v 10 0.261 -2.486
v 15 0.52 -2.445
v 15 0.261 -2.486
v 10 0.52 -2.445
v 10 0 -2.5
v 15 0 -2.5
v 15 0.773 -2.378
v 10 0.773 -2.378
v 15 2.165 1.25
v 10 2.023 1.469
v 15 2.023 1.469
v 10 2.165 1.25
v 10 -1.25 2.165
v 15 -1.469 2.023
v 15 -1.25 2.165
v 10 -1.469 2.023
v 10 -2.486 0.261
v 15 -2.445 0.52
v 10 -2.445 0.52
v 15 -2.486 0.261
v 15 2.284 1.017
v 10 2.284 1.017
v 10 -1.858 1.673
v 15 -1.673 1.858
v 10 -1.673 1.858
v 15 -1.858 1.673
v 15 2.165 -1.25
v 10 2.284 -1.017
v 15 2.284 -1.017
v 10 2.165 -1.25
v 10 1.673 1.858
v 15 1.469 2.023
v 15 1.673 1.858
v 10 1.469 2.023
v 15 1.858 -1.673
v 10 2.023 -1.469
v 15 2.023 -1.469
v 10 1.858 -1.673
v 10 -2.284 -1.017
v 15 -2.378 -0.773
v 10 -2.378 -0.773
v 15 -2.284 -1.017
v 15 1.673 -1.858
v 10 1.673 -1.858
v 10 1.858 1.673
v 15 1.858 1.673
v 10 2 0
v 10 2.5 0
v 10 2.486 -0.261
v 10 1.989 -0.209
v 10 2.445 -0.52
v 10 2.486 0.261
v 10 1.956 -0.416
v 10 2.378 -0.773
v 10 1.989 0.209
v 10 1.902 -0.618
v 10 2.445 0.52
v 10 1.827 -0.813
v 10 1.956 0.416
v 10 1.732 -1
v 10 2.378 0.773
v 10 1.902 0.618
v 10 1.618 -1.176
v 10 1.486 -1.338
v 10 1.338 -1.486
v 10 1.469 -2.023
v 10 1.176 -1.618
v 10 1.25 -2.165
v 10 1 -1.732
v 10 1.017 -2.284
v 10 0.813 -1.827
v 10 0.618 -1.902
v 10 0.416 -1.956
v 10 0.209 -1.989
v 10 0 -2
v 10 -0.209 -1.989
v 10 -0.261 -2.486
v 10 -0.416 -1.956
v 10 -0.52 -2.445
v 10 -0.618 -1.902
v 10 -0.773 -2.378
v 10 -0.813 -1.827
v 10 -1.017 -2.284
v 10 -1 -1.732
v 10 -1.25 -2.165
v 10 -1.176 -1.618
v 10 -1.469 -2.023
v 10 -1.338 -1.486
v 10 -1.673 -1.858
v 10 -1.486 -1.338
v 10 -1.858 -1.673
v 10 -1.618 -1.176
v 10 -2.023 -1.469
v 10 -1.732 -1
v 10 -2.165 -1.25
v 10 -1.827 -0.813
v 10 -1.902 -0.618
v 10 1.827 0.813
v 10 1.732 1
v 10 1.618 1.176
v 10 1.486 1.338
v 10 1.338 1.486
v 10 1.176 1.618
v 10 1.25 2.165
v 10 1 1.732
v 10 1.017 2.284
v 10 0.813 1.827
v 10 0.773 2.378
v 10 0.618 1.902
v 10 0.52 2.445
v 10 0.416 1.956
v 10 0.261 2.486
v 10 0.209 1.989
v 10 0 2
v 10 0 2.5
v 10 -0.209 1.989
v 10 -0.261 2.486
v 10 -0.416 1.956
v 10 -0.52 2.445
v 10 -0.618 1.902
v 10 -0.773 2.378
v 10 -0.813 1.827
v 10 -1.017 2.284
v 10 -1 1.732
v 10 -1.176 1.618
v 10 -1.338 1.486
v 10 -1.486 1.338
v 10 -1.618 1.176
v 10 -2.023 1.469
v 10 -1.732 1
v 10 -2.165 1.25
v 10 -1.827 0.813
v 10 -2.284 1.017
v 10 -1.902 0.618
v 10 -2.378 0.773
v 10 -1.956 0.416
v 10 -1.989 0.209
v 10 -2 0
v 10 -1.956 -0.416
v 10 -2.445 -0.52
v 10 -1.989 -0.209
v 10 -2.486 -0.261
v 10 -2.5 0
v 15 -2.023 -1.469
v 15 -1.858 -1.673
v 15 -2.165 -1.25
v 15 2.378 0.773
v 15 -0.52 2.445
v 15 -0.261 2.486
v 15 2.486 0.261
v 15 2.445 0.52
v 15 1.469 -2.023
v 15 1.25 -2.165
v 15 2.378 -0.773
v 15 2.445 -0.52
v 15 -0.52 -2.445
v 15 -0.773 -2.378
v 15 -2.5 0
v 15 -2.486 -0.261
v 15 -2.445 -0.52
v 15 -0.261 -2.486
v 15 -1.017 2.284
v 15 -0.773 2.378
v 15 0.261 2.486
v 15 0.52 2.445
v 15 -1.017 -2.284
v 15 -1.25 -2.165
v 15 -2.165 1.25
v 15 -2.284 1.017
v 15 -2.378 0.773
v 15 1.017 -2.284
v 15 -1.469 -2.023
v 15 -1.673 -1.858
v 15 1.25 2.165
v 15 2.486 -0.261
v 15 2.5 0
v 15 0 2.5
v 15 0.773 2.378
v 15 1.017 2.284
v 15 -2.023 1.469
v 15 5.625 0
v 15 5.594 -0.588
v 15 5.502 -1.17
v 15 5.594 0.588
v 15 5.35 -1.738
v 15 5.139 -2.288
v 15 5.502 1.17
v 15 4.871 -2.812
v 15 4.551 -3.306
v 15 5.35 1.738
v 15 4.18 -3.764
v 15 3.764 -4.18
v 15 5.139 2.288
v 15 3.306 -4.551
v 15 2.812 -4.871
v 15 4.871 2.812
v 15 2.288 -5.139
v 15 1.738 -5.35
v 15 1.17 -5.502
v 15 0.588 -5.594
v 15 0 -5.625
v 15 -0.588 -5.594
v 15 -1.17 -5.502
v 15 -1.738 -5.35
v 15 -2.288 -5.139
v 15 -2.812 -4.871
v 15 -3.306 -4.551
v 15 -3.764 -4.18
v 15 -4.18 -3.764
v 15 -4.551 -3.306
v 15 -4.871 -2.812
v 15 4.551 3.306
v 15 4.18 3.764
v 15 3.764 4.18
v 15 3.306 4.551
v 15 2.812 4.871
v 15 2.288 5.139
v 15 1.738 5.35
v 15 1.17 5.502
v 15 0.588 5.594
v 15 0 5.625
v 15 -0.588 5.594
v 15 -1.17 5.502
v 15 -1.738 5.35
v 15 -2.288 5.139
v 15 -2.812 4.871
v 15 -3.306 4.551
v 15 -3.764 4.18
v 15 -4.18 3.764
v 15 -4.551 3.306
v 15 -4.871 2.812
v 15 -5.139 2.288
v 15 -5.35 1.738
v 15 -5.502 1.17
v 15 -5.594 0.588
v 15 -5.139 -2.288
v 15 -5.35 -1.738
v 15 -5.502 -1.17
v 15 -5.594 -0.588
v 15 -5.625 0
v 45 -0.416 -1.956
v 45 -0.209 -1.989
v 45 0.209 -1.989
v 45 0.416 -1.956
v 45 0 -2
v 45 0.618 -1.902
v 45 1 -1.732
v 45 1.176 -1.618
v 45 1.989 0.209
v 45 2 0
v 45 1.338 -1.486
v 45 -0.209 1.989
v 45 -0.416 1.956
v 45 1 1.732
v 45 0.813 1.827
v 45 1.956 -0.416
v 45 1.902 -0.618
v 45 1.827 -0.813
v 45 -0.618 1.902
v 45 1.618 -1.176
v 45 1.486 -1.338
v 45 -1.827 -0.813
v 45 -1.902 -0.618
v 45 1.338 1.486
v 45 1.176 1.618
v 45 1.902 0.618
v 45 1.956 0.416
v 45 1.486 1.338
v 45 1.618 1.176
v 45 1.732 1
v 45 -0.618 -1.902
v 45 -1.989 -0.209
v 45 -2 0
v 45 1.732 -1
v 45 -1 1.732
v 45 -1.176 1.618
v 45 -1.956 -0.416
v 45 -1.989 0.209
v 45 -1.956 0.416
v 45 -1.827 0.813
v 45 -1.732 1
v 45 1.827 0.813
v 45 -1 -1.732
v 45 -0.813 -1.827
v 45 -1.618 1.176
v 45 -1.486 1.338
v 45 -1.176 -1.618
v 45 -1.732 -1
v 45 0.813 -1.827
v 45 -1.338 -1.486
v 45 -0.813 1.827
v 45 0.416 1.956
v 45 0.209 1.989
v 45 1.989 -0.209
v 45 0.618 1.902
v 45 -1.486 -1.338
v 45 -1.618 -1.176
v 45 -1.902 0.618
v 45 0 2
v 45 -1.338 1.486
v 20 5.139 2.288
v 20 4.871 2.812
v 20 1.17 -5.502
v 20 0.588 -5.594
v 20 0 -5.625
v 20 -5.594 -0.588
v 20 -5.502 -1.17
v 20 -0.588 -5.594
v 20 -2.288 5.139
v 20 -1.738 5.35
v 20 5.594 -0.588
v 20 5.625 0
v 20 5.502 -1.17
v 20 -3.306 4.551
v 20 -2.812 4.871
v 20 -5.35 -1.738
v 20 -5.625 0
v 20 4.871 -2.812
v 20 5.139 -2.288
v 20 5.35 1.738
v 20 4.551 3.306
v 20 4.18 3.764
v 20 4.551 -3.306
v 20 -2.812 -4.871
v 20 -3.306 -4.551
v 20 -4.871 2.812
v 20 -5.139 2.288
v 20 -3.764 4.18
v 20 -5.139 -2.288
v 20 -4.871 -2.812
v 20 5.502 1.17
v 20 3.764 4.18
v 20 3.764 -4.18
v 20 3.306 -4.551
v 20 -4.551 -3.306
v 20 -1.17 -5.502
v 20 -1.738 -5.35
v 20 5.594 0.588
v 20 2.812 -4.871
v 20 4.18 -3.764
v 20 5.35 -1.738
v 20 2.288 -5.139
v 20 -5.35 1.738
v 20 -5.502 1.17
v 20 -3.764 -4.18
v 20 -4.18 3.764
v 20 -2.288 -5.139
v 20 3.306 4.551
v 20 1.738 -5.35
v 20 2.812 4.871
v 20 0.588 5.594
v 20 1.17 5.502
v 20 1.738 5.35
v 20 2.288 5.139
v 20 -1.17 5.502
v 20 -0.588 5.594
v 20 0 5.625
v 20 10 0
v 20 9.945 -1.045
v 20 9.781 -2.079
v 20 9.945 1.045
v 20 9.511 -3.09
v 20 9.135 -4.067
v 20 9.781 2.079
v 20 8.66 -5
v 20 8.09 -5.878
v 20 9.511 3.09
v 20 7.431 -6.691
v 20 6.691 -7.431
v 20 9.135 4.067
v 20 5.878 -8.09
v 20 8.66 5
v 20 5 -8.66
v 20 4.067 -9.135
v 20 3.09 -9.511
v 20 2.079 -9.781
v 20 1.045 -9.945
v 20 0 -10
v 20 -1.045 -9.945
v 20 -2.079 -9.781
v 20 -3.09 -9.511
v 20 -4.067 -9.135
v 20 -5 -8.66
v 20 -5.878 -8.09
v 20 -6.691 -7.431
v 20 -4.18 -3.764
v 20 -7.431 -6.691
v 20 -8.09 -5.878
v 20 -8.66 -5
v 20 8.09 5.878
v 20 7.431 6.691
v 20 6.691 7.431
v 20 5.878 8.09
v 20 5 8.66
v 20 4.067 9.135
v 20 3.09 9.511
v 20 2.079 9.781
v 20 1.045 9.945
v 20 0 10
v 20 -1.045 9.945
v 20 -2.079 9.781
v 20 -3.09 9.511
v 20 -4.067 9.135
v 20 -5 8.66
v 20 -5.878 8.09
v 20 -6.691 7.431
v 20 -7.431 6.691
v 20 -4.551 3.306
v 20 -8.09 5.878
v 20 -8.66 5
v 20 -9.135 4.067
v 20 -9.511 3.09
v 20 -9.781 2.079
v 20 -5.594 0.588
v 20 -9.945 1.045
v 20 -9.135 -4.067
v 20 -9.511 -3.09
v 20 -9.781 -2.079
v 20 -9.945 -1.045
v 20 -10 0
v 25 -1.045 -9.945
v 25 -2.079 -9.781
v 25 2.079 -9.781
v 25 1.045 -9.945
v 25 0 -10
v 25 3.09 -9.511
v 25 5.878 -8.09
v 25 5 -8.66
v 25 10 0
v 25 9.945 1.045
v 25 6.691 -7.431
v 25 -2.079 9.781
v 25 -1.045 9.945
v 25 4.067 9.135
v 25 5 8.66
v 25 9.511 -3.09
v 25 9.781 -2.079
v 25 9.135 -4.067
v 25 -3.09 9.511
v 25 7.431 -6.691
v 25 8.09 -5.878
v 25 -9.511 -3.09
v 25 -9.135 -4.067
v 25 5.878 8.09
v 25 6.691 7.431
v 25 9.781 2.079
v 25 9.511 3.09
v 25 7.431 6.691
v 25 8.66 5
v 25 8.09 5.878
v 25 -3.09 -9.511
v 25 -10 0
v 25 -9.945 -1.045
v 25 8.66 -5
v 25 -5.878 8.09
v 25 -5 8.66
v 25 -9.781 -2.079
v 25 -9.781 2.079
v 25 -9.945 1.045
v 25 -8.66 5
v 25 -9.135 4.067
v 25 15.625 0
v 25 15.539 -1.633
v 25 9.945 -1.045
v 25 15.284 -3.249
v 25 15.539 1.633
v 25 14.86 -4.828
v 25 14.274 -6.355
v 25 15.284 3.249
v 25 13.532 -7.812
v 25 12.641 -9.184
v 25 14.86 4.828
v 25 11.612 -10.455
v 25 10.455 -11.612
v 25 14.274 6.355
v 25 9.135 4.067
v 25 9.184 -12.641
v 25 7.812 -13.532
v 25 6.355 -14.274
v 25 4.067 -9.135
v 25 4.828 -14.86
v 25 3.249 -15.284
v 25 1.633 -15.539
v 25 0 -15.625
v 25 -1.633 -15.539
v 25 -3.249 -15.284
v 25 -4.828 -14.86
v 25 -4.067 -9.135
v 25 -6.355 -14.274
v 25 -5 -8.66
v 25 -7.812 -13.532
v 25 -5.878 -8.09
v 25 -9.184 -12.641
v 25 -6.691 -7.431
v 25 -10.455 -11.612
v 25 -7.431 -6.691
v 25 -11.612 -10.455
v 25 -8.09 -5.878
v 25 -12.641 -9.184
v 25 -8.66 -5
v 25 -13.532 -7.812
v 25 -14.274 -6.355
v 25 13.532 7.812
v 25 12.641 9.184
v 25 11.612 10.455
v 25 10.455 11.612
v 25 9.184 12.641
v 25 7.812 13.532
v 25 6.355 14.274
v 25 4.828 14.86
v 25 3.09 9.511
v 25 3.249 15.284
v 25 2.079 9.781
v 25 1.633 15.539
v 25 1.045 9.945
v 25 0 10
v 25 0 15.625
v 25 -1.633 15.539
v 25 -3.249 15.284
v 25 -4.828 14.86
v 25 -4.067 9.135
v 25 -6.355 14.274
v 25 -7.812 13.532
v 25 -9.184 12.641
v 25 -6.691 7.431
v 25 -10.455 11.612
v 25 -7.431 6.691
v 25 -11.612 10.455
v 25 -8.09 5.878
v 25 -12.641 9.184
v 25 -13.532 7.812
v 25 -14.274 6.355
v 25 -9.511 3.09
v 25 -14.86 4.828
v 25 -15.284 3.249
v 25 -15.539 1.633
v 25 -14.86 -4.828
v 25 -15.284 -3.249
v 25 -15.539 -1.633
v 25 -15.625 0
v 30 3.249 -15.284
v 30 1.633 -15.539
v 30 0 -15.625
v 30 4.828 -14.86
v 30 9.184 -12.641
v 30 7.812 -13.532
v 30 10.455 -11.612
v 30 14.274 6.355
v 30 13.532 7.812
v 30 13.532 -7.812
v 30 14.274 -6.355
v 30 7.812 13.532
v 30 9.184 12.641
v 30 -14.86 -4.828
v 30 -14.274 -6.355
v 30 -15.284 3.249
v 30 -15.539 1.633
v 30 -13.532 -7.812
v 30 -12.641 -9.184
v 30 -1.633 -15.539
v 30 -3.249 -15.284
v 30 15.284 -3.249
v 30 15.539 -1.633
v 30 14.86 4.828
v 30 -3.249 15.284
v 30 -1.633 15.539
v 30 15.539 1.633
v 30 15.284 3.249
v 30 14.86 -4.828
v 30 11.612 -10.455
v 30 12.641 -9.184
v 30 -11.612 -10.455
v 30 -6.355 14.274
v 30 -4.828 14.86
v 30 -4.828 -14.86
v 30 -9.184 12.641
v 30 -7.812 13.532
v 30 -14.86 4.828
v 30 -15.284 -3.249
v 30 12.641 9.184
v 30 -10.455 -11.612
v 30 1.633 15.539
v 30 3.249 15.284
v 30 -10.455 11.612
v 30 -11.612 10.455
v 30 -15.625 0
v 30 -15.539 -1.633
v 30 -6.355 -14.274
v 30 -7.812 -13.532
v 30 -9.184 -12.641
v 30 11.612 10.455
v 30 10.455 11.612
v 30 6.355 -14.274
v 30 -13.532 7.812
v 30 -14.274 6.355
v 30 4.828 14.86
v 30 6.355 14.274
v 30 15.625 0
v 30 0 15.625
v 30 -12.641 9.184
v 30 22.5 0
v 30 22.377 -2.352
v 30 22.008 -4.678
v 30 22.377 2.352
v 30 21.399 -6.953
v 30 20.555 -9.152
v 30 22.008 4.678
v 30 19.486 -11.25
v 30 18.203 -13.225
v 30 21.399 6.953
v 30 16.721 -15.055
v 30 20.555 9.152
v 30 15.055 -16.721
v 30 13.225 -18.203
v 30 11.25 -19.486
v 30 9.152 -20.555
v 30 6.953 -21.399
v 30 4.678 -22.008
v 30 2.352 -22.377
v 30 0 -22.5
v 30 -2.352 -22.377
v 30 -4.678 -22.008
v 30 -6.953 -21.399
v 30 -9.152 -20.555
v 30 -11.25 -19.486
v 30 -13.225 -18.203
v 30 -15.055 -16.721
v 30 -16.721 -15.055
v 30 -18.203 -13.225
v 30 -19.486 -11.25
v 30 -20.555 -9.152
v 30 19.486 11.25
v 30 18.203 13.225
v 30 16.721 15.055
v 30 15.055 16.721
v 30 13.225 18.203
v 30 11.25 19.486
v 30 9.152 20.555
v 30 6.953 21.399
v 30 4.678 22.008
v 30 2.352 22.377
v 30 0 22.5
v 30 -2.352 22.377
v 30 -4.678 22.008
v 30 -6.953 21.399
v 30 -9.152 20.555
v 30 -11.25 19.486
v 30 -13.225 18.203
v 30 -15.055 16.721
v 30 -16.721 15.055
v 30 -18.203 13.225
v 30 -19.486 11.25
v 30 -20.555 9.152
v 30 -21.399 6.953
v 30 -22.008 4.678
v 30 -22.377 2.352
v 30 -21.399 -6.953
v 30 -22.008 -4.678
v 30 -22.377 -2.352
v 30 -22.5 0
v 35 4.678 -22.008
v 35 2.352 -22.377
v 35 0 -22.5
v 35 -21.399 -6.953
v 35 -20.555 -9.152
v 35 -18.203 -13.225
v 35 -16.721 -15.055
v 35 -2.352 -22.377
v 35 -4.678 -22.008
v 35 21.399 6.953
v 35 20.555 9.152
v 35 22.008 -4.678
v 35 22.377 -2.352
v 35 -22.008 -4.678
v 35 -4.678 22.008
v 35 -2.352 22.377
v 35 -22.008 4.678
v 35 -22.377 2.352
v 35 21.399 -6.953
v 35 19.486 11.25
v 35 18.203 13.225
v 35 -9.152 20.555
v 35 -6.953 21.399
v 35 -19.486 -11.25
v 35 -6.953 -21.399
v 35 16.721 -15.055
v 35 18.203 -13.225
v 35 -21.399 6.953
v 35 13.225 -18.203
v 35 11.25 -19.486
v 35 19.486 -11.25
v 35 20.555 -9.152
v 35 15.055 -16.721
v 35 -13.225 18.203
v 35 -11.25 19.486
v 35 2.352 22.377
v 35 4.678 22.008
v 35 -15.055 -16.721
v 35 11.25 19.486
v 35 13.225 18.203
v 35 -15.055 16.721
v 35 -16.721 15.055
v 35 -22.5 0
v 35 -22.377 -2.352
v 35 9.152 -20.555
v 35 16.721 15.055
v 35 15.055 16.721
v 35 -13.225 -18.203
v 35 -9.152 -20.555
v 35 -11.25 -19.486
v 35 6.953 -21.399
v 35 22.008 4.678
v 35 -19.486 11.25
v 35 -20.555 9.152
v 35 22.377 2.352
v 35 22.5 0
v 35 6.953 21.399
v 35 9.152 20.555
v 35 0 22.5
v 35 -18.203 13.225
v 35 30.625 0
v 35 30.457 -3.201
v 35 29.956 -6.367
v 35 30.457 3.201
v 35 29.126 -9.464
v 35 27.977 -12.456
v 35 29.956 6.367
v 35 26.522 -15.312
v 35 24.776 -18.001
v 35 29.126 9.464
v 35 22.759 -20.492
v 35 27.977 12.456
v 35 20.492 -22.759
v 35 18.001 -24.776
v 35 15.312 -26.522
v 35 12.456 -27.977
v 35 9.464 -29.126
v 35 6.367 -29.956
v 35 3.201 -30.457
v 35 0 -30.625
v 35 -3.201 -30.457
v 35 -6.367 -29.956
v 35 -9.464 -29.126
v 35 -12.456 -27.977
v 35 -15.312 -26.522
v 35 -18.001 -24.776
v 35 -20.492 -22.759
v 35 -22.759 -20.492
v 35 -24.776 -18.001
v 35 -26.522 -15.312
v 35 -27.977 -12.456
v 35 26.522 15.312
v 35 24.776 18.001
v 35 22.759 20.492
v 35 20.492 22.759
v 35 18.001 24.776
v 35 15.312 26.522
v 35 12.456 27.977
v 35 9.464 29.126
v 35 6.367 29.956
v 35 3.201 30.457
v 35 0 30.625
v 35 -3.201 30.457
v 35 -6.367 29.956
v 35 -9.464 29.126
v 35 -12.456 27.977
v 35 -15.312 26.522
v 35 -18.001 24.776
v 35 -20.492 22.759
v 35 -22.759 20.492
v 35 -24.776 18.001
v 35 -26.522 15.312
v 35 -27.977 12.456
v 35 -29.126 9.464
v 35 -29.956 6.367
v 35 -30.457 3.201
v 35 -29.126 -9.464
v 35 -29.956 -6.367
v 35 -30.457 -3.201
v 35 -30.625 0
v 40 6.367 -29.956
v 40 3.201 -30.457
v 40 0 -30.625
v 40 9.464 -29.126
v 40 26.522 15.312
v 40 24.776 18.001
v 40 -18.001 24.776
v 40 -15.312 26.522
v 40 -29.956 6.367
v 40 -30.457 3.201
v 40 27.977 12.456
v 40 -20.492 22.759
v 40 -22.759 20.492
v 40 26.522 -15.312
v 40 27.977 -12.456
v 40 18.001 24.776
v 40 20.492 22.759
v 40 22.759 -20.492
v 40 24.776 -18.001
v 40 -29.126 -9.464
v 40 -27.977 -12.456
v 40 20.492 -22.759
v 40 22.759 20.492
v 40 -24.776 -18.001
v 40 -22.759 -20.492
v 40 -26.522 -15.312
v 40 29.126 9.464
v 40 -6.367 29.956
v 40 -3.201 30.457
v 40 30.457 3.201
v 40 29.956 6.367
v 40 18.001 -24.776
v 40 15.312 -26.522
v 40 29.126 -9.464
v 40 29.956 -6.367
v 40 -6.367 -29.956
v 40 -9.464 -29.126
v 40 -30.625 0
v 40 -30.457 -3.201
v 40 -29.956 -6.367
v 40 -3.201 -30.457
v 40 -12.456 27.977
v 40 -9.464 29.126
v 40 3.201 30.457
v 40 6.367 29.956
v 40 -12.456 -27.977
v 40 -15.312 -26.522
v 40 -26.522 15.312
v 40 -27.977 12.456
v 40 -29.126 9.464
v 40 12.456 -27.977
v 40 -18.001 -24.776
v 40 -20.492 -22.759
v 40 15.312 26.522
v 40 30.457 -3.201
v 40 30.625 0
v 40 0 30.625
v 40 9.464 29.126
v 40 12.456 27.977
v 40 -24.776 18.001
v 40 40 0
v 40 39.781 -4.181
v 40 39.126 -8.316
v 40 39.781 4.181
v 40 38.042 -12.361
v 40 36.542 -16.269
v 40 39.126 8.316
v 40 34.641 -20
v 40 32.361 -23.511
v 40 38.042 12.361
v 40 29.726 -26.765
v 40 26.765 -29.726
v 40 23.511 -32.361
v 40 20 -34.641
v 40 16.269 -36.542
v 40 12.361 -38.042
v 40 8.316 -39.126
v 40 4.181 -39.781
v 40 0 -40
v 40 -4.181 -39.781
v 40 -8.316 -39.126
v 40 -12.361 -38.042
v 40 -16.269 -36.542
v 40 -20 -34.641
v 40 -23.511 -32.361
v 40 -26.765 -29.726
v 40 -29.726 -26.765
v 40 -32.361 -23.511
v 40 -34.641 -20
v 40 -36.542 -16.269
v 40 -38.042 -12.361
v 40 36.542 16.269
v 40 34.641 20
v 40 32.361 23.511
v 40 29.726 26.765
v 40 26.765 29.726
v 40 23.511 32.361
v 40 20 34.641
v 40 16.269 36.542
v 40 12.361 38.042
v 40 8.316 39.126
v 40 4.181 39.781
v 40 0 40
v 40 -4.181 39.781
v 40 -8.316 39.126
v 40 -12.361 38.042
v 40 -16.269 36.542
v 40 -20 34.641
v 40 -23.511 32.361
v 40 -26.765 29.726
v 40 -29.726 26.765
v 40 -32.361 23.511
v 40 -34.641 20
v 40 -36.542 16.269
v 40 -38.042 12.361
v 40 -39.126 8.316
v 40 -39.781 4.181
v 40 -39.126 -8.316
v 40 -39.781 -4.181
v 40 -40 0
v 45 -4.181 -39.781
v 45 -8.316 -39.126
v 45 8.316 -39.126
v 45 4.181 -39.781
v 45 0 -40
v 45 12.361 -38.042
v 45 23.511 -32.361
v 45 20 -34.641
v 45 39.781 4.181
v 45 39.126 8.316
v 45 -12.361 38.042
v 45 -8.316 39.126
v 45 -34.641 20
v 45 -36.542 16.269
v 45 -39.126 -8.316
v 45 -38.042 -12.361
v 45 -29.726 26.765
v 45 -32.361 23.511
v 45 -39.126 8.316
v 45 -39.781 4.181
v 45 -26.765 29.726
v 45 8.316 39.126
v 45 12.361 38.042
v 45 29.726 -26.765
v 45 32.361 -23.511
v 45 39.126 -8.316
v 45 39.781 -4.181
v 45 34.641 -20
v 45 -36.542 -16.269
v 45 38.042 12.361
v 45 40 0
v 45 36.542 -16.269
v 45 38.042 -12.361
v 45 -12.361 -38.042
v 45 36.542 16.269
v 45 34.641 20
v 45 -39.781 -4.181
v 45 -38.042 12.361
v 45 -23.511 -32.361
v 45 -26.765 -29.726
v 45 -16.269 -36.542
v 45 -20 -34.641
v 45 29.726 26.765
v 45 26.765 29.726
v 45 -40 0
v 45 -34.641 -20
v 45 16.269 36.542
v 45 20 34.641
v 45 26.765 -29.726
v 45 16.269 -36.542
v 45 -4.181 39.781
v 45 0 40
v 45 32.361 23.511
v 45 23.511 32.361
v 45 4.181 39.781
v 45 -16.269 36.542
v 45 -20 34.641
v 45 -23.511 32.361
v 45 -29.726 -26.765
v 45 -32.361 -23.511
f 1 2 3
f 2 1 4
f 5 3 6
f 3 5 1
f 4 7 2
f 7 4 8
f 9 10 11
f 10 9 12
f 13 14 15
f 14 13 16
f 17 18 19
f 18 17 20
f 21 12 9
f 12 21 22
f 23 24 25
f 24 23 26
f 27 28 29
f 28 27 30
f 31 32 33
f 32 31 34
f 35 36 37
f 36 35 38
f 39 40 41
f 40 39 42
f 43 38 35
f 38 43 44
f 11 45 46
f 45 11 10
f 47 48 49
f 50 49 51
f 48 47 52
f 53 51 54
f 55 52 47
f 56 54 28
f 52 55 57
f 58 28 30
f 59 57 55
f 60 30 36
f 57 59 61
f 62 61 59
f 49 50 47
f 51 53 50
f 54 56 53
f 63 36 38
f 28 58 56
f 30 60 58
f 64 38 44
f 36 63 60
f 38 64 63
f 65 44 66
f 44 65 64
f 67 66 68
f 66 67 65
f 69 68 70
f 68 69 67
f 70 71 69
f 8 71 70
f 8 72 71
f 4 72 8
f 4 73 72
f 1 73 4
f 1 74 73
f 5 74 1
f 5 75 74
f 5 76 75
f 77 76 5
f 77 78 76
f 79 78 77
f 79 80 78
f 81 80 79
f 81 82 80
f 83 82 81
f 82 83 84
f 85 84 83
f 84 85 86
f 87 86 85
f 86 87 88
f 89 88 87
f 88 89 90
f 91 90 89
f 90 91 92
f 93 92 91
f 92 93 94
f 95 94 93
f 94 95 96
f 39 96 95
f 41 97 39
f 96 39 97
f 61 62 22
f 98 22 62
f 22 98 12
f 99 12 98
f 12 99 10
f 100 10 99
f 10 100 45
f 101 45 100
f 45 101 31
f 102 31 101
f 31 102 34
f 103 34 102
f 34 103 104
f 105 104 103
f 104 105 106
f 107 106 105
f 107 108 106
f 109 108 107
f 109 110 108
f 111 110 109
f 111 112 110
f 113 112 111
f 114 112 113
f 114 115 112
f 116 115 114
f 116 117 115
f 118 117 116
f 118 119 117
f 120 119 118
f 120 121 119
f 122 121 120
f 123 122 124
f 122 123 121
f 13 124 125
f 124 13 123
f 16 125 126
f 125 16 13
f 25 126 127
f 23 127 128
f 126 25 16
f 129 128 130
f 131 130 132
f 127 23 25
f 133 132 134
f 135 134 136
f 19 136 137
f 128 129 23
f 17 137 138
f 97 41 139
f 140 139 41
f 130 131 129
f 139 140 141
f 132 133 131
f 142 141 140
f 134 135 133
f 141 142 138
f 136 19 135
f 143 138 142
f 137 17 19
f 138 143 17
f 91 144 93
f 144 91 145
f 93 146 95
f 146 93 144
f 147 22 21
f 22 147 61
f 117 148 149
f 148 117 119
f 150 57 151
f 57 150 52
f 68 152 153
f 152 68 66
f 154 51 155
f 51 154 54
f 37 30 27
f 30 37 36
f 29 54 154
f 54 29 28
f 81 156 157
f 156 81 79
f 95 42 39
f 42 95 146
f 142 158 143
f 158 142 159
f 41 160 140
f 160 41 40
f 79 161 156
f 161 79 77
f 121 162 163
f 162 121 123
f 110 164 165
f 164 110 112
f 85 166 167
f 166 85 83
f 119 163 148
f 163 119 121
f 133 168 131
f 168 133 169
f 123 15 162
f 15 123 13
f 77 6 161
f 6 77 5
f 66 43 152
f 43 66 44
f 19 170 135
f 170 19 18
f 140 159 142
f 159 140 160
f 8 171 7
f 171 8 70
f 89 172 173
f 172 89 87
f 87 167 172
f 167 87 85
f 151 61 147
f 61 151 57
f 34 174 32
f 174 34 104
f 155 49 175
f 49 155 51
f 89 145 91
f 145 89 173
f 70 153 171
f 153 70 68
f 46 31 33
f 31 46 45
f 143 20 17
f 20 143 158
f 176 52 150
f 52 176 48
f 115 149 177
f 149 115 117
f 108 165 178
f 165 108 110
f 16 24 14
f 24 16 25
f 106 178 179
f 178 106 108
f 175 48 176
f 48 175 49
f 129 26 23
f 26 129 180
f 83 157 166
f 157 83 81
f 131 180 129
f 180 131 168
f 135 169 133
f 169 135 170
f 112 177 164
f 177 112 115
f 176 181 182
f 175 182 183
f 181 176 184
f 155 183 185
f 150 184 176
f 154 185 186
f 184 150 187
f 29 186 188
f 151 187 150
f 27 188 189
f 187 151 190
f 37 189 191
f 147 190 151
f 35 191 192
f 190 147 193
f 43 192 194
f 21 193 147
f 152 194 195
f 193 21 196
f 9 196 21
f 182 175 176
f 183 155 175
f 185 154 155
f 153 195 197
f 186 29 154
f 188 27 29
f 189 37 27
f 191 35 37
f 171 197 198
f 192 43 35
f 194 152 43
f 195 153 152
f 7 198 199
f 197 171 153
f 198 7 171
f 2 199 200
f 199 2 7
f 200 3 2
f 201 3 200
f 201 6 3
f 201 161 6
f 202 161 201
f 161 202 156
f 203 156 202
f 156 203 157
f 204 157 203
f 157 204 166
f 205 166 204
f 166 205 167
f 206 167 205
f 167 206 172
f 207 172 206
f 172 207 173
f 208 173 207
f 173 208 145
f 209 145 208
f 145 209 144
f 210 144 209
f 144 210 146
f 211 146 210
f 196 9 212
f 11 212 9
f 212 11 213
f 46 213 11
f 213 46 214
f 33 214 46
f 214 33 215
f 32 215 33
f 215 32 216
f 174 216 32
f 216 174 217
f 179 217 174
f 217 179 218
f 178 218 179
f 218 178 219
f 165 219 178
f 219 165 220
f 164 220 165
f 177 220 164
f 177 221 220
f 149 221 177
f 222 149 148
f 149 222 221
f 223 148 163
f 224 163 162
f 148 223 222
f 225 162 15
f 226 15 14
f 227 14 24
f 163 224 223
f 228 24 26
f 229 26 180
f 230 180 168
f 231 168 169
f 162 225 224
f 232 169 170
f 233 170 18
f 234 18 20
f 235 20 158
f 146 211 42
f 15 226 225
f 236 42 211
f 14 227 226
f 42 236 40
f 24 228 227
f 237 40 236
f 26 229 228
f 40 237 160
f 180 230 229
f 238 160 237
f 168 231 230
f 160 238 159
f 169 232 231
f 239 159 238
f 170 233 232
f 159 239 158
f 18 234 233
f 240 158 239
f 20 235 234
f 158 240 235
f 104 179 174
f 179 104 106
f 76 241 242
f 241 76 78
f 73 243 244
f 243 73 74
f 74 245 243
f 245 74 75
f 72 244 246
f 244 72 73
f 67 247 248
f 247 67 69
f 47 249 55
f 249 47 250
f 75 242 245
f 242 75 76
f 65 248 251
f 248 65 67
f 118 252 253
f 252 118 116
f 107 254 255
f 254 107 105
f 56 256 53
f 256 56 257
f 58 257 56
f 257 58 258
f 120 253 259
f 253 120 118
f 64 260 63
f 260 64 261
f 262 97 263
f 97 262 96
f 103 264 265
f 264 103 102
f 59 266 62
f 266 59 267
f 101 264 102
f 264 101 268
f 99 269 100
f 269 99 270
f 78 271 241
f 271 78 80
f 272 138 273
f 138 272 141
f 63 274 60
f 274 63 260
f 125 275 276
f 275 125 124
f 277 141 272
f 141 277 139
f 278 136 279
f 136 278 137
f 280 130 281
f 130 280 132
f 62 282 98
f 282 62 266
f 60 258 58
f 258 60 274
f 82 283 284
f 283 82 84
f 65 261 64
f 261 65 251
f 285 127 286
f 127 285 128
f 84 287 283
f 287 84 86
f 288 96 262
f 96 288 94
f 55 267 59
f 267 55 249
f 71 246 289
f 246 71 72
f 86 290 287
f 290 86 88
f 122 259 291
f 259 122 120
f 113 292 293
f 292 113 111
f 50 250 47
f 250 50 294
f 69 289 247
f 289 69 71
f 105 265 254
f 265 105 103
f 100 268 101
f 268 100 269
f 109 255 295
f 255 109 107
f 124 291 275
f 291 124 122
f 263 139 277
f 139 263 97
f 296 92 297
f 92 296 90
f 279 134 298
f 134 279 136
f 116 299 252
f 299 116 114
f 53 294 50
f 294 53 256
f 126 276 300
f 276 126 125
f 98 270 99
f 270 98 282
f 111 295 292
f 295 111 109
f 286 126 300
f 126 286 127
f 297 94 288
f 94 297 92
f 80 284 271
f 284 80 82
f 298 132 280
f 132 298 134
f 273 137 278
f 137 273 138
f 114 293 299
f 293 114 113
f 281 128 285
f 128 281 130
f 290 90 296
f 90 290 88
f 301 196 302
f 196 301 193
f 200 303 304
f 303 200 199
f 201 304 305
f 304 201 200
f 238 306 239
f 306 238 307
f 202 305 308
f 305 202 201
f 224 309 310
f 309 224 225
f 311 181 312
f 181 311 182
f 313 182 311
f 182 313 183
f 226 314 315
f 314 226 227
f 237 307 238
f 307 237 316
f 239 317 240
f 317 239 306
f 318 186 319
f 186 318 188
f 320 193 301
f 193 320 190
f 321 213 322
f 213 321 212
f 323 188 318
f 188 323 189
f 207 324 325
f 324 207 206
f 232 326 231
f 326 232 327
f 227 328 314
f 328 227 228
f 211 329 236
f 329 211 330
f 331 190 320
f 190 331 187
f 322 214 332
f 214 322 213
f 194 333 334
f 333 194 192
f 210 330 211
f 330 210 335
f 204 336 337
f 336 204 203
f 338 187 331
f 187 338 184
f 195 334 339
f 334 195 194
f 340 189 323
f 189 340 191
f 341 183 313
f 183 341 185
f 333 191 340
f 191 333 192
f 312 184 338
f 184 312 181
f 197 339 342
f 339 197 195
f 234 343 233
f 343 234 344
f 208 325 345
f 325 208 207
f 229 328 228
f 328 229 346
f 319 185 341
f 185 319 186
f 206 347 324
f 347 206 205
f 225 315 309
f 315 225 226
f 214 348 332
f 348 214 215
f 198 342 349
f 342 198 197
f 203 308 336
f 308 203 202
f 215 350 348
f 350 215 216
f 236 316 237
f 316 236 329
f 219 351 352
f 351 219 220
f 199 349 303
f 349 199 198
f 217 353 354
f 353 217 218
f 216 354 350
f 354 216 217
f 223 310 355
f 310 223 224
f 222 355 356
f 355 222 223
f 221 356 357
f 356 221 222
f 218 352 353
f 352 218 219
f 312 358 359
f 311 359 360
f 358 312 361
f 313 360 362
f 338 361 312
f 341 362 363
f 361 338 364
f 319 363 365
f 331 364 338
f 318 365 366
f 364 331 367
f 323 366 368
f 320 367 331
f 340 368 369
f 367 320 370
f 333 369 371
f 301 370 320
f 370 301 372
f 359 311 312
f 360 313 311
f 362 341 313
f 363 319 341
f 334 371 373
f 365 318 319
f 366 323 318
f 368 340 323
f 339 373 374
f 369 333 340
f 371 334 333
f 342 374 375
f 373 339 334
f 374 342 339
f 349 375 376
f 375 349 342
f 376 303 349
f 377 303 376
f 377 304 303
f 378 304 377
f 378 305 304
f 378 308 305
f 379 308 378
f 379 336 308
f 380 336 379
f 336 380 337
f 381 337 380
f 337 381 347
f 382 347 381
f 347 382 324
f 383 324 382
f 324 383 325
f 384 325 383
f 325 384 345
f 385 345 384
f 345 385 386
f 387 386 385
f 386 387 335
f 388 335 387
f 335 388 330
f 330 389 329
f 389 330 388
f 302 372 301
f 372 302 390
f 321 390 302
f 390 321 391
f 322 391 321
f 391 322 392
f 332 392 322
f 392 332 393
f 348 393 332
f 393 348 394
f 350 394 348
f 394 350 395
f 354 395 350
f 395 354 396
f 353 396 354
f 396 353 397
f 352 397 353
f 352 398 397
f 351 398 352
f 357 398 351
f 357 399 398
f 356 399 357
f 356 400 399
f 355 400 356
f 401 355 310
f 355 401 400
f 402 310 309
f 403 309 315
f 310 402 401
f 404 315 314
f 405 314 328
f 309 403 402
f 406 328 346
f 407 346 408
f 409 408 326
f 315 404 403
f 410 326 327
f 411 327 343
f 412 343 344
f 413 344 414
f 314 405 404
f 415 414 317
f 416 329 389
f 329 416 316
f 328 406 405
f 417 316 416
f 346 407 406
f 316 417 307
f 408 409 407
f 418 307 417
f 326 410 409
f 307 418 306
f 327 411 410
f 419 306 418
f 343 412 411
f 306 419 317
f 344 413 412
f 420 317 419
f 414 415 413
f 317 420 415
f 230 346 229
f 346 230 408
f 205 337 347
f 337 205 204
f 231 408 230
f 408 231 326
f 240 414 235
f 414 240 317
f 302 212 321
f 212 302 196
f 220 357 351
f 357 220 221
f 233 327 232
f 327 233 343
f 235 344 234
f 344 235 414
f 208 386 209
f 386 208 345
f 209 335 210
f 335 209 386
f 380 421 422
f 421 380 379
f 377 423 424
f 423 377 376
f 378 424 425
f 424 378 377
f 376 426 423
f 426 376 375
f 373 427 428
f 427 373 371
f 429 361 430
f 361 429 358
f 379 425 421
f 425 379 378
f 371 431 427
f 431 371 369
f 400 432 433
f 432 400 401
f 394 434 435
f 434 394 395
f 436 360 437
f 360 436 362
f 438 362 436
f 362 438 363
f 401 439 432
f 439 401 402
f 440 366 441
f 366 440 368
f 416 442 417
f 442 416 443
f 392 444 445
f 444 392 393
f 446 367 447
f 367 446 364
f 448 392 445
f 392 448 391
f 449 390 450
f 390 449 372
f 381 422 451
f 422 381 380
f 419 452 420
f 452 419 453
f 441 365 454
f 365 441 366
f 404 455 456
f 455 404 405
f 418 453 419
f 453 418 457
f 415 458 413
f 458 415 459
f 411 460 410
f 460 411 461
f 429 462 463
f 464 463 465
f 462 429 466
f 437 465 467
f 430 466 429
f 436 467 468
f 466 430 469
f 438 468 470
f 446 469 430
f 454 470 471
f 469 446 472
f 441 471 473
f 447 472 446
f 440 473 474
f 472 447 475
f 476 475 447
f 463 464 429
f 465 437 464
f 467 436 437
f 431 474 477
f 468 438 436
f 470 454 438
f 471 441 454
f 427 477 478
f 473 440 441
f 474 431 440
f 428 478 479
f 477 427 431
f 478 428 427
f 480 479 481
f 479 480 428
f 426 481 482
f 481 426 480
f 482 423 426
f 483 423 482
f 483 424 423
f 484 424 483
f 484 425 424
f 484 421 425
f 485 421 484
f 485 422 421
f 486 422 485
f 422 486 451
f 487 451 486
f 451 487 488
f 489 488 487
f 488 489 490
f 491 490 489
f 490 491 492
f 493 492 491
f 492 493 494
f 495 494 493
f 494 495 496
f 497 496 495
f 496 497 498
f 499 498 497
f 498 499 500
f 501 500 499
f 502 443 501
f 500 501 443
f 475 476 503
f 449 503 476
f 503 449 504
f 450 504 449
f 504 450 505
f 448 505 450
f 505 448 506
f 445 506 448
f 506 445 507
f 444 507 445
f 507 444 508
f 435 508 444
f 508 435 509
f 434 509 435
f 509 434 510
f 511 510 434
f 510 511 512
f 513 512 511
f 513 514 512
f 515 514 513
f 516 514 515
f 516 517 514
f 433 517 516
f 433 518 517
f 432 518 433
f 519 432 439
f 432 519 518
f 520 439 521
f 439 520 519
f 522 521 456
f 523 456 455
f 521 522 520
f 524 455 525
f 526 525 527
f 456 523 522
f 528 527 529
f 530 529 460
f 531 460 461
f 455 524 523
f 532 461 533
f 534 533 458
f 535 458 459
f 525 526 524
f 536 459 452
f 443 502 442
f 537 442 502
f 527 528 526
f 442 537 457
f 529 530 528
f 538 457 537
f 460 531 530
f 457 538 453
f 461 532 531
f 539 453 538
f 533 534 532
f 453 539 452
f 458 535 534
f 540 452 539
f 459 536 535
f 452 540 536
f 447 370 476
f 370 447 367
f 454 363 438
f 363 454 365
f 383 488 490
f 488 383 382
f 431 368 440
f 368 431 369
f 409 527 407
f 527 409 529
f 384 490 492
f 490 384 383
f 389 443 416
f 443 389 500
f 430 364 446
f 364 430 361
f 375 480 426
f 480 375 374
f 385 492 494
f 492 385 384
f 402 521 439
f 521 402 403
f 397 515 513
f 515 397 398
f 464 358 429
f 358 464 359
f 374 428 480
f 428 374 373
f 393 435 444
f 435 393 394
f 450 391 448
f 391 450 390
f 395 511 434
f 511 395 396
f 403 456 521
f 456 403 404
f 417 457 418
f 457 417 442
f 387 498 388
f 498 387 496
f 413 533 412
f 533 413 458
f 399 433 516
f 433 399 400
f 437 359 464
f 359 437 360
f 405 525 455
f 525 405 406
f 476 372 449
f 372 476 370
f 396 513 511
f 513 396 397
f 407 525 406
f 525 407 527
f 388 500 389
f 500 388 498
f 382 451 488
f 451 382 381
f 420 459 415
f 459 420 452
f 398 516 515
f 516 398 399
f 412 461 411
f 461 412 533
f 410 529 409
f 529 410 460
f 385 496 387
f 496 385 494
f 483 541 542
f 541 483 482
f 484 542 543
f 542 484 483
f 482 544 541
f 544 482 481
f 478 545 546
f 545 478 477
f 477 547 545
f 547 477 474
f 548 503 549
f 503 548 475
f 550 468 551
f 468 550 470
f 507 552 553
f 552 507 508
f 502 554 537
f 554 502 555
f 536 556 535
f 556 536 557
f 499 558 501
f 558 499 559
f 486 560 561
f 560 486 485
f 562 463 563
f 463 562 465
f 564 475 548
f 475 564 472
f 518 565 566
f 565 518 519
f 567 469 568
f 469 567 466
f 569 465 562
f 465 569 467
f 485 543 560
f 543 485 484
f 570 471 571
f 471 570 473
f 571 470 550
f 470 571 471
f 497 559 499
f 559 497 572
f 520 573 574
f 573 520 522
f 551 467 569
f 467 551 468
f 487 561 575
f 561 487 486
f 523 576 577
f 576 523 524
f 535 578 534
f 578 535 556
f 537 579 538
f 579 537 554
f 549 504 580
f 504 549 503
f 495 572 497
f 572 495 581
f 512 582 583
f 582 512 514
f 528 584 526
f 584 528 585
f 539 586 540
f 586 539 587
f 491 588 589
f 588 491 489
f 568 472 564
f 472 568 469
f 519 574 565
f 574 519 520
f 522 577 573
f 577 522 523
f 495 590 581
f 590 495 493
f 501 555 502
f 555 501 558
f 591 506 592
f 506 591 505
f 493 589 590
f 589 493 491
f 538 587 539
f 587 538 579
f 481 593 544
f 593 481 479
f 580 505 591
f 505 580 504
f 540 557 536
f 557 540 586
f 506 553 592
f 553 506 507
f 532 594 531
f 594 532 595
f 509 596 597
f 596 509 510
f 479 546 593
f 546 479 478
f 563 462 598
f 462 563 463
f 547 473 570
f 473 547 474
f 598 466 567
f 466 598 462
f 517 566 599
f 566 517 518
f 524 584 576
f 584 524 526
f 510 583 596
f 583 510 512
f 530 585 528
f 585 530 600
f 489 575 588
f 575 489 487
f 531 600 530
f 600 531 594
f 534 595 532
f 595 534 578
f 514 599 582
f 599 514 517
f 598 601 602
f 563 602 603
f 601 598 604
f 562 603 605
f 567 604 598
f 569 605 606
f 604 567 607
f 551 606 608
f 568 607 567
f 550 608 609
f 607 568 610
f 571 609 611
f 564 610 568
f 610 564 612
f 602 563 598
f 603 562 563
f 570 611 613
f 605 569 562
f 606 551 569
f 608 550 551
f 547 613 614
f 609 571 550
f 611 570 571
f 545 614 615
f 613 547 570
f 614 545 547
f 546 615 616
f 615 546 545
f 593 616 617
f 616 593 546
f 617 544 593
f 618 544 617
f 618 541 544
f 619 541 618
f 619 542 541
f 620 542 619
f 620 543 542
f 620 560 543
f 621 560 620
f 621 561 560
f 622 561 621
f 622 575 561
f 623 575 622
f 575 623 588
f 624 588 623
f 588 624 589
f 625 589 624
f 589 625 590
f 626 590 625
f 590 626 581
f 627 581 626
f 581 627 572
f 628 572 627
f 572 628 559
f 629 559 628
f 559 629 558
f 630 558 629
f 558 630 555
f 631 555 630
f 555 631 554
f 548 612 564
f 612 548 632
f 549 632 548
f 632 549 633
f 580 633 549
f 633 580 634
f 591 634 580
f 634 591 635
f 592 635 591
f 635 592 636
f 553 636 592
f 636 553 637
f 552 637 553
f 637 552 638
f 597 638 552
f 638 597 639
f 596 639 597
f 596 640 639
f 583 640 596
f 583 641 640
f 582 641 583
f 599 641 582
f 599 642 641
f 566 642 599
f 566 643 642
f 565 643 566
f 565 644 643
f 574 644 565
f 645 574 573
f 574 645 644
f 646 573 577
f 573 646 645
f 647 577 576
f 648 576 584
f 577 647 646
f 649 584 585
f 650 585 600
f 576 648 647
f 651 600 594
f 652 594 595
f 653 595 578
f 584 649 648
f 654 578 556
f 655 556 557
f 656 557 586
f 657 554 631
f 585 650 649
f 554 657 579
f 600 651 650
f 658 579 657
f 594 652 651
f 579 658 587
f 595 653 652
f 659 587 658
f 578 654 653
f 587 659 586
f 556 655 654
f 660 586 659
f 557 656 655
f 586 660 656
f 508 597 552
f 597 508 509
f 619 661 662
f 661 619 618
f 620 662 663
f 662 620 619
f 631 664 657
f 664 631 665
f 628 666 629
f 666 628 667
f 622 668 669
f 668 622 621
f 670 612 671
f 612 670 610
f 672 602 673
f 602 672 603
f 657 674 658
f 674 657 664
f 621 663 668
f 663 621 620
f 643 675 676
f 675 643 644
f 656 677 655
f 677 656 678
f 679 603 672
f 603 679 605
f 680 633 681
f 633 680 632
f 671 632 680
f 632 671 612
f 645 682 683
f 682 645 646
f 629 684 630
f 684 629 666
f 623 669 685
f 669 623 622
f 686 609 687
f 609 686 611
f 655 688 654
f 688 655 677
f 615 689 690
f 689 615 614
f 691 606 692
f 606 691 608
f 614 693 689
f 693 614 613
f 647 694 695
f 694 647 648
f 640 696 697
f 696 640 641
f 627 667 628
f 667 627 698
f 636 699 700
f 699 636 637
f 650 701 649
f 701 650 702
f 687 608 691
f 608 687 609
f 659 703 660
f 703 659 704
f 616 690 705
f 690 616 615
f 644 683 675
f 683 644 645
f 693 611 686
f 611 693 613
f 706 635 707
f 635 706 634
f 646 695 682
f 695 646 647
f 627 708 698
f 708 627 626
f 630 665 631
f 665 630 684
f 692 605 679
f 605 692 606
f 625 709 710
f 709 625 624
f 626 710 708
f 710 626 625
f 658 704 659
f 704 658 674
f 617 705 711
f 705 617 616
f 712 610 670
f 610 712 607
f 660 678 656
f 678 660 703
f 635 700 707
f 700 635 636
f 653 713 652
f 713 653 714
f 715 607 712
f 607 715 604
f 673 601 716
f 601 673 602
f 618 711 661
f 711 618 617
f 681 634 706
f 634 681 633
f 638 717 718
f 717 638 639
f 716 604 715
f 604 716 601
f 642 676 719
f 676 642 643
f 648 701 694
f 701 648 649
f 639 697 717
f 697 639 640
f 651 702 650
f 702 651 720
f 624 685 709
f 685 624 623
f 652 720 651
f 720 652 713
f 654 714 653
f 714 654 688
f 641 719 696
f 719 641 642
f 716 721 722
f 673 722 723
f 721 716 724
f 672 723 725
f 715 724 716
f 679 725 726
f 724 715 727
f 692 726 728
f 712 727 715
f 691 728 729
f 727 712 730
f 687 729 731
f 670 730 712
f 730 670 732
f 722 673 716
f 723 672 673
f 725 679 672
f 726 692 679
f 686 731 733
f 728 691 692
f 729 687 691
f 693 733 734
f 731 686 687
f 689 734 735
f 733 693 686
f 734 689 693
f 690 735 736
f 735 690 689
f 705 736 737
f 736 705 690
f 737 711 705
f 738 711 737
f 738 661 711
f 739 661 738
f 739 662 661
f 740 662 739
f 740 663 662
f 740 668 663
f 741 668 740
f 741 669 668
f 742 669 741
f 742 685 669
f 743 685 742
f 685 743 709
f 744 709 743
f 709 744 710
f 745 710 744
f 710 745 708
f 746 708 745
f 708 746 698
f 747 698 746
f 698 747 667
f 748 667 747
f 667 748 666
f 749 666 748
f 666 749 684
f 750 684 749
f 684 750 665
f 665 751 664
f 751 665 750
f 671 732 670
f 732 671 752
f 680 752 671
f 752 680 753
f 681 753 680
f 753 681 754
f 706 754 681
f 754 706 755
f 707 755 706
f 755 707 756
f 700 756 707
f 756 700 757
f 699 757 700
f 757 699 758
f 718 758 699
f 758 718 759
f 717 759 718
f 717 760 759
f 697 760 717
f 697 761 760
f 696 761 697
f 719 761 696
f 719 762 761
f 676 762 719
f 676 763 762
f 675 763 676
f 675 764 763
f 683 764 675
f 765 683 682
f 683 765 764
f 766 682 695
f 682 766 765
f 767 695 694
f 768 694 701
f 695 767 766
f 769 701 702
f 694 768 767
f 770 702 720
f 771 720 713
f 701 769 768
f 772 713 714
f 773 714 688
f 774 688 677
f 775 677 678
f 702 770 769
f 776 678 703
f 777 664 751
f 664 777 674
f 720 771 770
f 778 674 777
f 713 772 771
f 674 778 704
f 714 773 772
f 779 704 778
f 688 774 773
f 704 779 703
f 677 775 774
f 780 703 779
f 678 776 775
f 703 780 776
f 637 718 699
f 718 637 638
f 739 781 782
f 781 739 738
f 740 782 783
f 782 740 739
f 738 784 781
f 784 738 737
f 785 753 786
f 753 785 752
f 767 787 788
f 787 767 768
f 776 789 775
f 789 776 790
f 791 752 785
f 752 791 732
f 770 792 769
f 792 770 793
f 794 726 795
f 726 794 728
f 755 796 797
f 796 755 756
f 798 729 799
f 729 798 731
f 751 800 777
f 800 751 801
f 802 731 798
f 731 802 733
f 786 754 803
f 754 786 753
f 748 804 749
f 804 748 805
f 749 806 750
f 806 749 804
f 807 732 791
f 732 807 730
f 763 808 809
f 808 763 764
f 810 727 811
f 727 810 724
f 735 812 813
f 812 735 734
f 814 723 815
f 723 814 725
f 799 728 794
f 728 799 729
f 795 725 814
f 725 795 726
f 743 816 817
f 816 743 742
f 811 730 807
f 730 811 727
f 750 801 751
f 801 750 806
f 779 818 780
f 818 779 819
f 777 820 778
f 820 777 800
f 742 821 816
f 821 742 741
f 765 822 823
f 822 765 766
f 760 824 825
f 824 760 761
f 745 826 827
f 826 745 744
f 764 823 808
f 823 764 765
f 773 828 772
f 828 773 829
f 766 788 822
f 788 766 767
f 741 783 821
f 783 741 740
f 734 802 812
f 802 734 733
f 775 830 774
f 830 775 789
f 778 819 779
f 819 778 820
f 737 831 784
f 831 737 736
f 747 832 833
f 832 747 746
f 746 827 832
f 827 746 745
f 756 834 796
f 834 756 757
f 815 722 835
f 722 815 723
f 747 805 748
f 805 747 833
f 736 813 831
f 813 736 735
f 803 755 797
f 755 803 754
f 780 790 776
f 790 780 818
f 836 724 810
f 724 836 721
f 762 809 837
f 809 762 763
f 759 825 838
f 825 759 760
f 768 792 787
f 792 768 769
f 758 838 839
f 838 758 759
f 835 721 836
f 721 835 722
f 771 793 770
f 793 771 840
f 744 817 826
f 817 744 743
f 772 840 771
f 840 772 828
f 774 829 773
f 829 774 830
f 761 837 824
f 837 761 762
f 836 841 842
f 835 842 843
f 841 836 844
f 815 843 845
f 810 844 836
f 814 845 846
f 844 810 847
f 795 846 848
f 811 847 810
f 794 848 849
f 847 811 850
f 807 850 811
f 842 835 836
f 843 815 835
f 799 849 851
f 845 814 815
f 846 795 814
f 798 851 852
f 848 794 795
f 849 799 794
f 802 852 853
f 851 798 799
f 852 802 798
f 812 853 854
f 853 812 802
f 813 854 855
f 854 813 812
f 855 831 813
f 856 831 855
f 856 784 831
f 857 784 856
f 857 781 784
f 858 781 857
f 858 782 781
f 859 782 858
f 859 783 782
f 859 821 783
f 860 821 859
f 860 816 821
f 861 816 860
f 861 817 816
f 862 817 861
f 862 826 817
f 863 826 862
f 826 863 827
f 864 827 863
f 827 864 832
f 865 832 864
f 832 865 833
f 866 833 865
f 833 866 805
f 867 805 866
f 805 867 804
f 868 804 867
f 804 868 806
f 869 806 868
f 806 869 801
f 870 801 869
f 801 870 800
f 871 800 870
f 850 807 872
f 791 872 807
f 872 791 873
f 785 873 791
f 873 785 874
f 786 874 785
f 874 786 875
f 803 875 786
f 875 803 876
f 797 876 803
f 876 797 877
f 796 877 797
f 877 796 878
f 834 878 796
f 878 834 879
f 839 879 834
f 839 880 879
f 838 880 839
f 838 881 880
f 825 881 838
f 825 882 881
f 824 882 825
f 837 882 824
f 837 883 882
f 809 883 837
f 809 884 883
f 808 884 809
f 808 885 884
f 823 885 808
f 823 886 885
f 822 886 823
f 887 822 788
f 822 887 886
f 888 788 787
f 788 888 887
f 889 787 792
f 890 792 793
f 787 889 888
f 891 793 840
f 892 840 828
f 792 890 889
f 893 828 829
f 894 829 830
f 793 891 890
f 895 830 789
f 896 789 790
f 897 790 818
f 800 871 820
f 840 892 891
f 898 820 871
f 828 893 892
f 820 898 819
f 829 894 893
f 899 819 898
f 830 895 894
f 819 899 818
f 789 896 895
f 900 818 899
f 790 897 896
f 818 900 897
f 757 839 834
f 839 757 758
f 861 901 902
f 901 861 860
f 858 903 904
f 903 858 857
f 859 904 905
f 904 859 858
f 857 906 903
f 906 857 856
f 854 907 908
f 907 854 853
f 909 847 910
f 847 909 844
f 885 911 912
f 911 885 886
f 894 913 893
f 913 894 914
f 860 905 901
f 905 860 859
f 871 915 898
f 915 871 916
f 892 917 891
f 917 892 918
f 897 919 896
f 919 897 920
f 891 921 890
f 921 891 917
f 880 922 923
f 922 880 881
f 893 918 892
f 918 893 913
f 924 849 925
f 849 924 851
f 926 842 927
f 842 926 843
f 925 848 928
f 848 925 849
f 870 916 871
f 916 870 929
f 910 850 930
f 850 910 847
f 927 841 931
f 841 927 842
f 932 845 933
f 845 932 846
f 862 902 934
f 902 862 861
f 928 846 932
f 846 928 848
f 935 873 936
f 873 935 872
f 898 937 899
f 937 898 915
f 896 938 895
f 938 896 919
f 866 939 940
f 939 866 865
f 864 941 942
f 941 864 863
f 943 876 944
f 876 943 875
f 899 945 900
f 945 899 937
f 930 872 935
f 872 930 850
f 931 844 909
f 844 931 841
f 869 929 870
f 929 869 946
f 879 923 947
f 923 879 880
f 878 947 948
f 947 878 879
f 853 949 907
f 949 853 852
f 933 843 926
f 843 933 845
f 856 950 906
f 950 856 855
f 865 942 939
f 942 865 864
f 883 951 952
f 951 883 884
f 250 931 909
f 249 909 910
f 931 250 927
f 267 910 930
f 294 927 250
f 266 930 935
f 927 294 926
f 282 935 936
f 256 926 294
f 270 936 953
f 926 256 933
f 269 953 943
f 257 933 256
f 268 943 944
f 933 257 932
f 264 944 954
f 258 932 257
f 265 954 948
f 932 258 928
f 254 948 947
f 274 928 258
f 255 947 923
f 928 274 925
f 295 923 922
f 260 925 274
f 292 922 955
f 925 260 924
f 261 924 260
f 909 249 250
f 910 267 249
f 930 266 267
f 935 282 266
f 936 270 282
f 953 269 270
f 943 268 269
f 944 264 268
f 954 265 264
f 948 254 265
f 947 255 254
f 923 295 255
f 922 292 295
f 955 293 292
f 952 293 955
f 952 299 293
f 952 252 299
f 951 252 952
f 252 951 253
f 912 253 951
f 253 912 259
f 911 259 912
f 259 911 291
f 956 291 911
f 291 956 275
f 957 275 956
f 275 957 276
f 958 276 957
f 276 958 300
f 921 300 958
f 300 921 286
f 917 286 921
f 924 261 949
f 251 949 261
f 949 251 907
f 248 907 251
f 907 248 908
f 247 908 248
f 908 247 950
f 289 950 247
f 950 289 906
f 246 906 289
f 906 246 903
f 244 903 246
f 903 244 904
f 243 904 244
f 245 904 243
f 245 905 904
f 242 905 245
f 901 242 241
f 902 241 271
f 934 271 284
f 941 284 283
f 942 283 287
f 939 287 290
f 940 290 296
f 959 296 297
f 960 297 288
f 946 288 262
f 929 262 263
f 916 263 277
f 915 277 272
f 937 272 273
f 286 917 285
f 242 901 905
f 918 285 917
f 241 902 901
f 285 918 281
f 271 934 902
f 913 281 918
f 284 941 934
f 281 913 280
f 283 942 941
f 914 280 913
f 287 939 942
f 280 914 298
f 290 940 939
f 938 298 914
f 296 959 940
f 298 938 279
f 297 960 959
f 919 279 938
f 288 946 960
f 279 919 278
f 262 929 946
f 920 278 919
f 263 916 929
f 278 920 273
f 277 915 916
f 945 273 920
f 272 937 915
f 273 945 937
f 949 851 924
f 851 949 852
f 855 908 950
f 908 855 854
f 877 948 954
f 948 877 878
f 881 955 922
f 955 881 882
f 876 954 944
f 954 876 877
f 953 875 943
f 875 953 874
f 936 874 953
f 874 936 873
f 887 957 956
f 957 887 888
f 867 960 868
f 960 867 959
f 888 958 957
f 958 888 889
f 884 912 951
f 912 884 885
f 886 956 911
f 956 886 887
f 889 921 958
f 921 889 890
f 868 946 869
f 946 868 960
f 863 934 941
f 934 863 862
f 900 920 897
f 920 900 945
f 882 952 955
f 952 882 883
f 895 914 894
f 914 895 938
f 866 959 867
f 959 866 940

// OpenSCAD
dx=5;

scale=10;
$fn=60;

n=round(4/(dx/scale));
echo (n);
for (i=[0:1:n]){
    x=i*dx/scale;
    echo(x);
    translate ([i*dx,0,0])
    rotate ([0,90,0])
    difference(){
        cylinder (h=dx,r=((.25)*(x^2))*scale);
        cylinder (h=dx,r=2);
    }
    
}
